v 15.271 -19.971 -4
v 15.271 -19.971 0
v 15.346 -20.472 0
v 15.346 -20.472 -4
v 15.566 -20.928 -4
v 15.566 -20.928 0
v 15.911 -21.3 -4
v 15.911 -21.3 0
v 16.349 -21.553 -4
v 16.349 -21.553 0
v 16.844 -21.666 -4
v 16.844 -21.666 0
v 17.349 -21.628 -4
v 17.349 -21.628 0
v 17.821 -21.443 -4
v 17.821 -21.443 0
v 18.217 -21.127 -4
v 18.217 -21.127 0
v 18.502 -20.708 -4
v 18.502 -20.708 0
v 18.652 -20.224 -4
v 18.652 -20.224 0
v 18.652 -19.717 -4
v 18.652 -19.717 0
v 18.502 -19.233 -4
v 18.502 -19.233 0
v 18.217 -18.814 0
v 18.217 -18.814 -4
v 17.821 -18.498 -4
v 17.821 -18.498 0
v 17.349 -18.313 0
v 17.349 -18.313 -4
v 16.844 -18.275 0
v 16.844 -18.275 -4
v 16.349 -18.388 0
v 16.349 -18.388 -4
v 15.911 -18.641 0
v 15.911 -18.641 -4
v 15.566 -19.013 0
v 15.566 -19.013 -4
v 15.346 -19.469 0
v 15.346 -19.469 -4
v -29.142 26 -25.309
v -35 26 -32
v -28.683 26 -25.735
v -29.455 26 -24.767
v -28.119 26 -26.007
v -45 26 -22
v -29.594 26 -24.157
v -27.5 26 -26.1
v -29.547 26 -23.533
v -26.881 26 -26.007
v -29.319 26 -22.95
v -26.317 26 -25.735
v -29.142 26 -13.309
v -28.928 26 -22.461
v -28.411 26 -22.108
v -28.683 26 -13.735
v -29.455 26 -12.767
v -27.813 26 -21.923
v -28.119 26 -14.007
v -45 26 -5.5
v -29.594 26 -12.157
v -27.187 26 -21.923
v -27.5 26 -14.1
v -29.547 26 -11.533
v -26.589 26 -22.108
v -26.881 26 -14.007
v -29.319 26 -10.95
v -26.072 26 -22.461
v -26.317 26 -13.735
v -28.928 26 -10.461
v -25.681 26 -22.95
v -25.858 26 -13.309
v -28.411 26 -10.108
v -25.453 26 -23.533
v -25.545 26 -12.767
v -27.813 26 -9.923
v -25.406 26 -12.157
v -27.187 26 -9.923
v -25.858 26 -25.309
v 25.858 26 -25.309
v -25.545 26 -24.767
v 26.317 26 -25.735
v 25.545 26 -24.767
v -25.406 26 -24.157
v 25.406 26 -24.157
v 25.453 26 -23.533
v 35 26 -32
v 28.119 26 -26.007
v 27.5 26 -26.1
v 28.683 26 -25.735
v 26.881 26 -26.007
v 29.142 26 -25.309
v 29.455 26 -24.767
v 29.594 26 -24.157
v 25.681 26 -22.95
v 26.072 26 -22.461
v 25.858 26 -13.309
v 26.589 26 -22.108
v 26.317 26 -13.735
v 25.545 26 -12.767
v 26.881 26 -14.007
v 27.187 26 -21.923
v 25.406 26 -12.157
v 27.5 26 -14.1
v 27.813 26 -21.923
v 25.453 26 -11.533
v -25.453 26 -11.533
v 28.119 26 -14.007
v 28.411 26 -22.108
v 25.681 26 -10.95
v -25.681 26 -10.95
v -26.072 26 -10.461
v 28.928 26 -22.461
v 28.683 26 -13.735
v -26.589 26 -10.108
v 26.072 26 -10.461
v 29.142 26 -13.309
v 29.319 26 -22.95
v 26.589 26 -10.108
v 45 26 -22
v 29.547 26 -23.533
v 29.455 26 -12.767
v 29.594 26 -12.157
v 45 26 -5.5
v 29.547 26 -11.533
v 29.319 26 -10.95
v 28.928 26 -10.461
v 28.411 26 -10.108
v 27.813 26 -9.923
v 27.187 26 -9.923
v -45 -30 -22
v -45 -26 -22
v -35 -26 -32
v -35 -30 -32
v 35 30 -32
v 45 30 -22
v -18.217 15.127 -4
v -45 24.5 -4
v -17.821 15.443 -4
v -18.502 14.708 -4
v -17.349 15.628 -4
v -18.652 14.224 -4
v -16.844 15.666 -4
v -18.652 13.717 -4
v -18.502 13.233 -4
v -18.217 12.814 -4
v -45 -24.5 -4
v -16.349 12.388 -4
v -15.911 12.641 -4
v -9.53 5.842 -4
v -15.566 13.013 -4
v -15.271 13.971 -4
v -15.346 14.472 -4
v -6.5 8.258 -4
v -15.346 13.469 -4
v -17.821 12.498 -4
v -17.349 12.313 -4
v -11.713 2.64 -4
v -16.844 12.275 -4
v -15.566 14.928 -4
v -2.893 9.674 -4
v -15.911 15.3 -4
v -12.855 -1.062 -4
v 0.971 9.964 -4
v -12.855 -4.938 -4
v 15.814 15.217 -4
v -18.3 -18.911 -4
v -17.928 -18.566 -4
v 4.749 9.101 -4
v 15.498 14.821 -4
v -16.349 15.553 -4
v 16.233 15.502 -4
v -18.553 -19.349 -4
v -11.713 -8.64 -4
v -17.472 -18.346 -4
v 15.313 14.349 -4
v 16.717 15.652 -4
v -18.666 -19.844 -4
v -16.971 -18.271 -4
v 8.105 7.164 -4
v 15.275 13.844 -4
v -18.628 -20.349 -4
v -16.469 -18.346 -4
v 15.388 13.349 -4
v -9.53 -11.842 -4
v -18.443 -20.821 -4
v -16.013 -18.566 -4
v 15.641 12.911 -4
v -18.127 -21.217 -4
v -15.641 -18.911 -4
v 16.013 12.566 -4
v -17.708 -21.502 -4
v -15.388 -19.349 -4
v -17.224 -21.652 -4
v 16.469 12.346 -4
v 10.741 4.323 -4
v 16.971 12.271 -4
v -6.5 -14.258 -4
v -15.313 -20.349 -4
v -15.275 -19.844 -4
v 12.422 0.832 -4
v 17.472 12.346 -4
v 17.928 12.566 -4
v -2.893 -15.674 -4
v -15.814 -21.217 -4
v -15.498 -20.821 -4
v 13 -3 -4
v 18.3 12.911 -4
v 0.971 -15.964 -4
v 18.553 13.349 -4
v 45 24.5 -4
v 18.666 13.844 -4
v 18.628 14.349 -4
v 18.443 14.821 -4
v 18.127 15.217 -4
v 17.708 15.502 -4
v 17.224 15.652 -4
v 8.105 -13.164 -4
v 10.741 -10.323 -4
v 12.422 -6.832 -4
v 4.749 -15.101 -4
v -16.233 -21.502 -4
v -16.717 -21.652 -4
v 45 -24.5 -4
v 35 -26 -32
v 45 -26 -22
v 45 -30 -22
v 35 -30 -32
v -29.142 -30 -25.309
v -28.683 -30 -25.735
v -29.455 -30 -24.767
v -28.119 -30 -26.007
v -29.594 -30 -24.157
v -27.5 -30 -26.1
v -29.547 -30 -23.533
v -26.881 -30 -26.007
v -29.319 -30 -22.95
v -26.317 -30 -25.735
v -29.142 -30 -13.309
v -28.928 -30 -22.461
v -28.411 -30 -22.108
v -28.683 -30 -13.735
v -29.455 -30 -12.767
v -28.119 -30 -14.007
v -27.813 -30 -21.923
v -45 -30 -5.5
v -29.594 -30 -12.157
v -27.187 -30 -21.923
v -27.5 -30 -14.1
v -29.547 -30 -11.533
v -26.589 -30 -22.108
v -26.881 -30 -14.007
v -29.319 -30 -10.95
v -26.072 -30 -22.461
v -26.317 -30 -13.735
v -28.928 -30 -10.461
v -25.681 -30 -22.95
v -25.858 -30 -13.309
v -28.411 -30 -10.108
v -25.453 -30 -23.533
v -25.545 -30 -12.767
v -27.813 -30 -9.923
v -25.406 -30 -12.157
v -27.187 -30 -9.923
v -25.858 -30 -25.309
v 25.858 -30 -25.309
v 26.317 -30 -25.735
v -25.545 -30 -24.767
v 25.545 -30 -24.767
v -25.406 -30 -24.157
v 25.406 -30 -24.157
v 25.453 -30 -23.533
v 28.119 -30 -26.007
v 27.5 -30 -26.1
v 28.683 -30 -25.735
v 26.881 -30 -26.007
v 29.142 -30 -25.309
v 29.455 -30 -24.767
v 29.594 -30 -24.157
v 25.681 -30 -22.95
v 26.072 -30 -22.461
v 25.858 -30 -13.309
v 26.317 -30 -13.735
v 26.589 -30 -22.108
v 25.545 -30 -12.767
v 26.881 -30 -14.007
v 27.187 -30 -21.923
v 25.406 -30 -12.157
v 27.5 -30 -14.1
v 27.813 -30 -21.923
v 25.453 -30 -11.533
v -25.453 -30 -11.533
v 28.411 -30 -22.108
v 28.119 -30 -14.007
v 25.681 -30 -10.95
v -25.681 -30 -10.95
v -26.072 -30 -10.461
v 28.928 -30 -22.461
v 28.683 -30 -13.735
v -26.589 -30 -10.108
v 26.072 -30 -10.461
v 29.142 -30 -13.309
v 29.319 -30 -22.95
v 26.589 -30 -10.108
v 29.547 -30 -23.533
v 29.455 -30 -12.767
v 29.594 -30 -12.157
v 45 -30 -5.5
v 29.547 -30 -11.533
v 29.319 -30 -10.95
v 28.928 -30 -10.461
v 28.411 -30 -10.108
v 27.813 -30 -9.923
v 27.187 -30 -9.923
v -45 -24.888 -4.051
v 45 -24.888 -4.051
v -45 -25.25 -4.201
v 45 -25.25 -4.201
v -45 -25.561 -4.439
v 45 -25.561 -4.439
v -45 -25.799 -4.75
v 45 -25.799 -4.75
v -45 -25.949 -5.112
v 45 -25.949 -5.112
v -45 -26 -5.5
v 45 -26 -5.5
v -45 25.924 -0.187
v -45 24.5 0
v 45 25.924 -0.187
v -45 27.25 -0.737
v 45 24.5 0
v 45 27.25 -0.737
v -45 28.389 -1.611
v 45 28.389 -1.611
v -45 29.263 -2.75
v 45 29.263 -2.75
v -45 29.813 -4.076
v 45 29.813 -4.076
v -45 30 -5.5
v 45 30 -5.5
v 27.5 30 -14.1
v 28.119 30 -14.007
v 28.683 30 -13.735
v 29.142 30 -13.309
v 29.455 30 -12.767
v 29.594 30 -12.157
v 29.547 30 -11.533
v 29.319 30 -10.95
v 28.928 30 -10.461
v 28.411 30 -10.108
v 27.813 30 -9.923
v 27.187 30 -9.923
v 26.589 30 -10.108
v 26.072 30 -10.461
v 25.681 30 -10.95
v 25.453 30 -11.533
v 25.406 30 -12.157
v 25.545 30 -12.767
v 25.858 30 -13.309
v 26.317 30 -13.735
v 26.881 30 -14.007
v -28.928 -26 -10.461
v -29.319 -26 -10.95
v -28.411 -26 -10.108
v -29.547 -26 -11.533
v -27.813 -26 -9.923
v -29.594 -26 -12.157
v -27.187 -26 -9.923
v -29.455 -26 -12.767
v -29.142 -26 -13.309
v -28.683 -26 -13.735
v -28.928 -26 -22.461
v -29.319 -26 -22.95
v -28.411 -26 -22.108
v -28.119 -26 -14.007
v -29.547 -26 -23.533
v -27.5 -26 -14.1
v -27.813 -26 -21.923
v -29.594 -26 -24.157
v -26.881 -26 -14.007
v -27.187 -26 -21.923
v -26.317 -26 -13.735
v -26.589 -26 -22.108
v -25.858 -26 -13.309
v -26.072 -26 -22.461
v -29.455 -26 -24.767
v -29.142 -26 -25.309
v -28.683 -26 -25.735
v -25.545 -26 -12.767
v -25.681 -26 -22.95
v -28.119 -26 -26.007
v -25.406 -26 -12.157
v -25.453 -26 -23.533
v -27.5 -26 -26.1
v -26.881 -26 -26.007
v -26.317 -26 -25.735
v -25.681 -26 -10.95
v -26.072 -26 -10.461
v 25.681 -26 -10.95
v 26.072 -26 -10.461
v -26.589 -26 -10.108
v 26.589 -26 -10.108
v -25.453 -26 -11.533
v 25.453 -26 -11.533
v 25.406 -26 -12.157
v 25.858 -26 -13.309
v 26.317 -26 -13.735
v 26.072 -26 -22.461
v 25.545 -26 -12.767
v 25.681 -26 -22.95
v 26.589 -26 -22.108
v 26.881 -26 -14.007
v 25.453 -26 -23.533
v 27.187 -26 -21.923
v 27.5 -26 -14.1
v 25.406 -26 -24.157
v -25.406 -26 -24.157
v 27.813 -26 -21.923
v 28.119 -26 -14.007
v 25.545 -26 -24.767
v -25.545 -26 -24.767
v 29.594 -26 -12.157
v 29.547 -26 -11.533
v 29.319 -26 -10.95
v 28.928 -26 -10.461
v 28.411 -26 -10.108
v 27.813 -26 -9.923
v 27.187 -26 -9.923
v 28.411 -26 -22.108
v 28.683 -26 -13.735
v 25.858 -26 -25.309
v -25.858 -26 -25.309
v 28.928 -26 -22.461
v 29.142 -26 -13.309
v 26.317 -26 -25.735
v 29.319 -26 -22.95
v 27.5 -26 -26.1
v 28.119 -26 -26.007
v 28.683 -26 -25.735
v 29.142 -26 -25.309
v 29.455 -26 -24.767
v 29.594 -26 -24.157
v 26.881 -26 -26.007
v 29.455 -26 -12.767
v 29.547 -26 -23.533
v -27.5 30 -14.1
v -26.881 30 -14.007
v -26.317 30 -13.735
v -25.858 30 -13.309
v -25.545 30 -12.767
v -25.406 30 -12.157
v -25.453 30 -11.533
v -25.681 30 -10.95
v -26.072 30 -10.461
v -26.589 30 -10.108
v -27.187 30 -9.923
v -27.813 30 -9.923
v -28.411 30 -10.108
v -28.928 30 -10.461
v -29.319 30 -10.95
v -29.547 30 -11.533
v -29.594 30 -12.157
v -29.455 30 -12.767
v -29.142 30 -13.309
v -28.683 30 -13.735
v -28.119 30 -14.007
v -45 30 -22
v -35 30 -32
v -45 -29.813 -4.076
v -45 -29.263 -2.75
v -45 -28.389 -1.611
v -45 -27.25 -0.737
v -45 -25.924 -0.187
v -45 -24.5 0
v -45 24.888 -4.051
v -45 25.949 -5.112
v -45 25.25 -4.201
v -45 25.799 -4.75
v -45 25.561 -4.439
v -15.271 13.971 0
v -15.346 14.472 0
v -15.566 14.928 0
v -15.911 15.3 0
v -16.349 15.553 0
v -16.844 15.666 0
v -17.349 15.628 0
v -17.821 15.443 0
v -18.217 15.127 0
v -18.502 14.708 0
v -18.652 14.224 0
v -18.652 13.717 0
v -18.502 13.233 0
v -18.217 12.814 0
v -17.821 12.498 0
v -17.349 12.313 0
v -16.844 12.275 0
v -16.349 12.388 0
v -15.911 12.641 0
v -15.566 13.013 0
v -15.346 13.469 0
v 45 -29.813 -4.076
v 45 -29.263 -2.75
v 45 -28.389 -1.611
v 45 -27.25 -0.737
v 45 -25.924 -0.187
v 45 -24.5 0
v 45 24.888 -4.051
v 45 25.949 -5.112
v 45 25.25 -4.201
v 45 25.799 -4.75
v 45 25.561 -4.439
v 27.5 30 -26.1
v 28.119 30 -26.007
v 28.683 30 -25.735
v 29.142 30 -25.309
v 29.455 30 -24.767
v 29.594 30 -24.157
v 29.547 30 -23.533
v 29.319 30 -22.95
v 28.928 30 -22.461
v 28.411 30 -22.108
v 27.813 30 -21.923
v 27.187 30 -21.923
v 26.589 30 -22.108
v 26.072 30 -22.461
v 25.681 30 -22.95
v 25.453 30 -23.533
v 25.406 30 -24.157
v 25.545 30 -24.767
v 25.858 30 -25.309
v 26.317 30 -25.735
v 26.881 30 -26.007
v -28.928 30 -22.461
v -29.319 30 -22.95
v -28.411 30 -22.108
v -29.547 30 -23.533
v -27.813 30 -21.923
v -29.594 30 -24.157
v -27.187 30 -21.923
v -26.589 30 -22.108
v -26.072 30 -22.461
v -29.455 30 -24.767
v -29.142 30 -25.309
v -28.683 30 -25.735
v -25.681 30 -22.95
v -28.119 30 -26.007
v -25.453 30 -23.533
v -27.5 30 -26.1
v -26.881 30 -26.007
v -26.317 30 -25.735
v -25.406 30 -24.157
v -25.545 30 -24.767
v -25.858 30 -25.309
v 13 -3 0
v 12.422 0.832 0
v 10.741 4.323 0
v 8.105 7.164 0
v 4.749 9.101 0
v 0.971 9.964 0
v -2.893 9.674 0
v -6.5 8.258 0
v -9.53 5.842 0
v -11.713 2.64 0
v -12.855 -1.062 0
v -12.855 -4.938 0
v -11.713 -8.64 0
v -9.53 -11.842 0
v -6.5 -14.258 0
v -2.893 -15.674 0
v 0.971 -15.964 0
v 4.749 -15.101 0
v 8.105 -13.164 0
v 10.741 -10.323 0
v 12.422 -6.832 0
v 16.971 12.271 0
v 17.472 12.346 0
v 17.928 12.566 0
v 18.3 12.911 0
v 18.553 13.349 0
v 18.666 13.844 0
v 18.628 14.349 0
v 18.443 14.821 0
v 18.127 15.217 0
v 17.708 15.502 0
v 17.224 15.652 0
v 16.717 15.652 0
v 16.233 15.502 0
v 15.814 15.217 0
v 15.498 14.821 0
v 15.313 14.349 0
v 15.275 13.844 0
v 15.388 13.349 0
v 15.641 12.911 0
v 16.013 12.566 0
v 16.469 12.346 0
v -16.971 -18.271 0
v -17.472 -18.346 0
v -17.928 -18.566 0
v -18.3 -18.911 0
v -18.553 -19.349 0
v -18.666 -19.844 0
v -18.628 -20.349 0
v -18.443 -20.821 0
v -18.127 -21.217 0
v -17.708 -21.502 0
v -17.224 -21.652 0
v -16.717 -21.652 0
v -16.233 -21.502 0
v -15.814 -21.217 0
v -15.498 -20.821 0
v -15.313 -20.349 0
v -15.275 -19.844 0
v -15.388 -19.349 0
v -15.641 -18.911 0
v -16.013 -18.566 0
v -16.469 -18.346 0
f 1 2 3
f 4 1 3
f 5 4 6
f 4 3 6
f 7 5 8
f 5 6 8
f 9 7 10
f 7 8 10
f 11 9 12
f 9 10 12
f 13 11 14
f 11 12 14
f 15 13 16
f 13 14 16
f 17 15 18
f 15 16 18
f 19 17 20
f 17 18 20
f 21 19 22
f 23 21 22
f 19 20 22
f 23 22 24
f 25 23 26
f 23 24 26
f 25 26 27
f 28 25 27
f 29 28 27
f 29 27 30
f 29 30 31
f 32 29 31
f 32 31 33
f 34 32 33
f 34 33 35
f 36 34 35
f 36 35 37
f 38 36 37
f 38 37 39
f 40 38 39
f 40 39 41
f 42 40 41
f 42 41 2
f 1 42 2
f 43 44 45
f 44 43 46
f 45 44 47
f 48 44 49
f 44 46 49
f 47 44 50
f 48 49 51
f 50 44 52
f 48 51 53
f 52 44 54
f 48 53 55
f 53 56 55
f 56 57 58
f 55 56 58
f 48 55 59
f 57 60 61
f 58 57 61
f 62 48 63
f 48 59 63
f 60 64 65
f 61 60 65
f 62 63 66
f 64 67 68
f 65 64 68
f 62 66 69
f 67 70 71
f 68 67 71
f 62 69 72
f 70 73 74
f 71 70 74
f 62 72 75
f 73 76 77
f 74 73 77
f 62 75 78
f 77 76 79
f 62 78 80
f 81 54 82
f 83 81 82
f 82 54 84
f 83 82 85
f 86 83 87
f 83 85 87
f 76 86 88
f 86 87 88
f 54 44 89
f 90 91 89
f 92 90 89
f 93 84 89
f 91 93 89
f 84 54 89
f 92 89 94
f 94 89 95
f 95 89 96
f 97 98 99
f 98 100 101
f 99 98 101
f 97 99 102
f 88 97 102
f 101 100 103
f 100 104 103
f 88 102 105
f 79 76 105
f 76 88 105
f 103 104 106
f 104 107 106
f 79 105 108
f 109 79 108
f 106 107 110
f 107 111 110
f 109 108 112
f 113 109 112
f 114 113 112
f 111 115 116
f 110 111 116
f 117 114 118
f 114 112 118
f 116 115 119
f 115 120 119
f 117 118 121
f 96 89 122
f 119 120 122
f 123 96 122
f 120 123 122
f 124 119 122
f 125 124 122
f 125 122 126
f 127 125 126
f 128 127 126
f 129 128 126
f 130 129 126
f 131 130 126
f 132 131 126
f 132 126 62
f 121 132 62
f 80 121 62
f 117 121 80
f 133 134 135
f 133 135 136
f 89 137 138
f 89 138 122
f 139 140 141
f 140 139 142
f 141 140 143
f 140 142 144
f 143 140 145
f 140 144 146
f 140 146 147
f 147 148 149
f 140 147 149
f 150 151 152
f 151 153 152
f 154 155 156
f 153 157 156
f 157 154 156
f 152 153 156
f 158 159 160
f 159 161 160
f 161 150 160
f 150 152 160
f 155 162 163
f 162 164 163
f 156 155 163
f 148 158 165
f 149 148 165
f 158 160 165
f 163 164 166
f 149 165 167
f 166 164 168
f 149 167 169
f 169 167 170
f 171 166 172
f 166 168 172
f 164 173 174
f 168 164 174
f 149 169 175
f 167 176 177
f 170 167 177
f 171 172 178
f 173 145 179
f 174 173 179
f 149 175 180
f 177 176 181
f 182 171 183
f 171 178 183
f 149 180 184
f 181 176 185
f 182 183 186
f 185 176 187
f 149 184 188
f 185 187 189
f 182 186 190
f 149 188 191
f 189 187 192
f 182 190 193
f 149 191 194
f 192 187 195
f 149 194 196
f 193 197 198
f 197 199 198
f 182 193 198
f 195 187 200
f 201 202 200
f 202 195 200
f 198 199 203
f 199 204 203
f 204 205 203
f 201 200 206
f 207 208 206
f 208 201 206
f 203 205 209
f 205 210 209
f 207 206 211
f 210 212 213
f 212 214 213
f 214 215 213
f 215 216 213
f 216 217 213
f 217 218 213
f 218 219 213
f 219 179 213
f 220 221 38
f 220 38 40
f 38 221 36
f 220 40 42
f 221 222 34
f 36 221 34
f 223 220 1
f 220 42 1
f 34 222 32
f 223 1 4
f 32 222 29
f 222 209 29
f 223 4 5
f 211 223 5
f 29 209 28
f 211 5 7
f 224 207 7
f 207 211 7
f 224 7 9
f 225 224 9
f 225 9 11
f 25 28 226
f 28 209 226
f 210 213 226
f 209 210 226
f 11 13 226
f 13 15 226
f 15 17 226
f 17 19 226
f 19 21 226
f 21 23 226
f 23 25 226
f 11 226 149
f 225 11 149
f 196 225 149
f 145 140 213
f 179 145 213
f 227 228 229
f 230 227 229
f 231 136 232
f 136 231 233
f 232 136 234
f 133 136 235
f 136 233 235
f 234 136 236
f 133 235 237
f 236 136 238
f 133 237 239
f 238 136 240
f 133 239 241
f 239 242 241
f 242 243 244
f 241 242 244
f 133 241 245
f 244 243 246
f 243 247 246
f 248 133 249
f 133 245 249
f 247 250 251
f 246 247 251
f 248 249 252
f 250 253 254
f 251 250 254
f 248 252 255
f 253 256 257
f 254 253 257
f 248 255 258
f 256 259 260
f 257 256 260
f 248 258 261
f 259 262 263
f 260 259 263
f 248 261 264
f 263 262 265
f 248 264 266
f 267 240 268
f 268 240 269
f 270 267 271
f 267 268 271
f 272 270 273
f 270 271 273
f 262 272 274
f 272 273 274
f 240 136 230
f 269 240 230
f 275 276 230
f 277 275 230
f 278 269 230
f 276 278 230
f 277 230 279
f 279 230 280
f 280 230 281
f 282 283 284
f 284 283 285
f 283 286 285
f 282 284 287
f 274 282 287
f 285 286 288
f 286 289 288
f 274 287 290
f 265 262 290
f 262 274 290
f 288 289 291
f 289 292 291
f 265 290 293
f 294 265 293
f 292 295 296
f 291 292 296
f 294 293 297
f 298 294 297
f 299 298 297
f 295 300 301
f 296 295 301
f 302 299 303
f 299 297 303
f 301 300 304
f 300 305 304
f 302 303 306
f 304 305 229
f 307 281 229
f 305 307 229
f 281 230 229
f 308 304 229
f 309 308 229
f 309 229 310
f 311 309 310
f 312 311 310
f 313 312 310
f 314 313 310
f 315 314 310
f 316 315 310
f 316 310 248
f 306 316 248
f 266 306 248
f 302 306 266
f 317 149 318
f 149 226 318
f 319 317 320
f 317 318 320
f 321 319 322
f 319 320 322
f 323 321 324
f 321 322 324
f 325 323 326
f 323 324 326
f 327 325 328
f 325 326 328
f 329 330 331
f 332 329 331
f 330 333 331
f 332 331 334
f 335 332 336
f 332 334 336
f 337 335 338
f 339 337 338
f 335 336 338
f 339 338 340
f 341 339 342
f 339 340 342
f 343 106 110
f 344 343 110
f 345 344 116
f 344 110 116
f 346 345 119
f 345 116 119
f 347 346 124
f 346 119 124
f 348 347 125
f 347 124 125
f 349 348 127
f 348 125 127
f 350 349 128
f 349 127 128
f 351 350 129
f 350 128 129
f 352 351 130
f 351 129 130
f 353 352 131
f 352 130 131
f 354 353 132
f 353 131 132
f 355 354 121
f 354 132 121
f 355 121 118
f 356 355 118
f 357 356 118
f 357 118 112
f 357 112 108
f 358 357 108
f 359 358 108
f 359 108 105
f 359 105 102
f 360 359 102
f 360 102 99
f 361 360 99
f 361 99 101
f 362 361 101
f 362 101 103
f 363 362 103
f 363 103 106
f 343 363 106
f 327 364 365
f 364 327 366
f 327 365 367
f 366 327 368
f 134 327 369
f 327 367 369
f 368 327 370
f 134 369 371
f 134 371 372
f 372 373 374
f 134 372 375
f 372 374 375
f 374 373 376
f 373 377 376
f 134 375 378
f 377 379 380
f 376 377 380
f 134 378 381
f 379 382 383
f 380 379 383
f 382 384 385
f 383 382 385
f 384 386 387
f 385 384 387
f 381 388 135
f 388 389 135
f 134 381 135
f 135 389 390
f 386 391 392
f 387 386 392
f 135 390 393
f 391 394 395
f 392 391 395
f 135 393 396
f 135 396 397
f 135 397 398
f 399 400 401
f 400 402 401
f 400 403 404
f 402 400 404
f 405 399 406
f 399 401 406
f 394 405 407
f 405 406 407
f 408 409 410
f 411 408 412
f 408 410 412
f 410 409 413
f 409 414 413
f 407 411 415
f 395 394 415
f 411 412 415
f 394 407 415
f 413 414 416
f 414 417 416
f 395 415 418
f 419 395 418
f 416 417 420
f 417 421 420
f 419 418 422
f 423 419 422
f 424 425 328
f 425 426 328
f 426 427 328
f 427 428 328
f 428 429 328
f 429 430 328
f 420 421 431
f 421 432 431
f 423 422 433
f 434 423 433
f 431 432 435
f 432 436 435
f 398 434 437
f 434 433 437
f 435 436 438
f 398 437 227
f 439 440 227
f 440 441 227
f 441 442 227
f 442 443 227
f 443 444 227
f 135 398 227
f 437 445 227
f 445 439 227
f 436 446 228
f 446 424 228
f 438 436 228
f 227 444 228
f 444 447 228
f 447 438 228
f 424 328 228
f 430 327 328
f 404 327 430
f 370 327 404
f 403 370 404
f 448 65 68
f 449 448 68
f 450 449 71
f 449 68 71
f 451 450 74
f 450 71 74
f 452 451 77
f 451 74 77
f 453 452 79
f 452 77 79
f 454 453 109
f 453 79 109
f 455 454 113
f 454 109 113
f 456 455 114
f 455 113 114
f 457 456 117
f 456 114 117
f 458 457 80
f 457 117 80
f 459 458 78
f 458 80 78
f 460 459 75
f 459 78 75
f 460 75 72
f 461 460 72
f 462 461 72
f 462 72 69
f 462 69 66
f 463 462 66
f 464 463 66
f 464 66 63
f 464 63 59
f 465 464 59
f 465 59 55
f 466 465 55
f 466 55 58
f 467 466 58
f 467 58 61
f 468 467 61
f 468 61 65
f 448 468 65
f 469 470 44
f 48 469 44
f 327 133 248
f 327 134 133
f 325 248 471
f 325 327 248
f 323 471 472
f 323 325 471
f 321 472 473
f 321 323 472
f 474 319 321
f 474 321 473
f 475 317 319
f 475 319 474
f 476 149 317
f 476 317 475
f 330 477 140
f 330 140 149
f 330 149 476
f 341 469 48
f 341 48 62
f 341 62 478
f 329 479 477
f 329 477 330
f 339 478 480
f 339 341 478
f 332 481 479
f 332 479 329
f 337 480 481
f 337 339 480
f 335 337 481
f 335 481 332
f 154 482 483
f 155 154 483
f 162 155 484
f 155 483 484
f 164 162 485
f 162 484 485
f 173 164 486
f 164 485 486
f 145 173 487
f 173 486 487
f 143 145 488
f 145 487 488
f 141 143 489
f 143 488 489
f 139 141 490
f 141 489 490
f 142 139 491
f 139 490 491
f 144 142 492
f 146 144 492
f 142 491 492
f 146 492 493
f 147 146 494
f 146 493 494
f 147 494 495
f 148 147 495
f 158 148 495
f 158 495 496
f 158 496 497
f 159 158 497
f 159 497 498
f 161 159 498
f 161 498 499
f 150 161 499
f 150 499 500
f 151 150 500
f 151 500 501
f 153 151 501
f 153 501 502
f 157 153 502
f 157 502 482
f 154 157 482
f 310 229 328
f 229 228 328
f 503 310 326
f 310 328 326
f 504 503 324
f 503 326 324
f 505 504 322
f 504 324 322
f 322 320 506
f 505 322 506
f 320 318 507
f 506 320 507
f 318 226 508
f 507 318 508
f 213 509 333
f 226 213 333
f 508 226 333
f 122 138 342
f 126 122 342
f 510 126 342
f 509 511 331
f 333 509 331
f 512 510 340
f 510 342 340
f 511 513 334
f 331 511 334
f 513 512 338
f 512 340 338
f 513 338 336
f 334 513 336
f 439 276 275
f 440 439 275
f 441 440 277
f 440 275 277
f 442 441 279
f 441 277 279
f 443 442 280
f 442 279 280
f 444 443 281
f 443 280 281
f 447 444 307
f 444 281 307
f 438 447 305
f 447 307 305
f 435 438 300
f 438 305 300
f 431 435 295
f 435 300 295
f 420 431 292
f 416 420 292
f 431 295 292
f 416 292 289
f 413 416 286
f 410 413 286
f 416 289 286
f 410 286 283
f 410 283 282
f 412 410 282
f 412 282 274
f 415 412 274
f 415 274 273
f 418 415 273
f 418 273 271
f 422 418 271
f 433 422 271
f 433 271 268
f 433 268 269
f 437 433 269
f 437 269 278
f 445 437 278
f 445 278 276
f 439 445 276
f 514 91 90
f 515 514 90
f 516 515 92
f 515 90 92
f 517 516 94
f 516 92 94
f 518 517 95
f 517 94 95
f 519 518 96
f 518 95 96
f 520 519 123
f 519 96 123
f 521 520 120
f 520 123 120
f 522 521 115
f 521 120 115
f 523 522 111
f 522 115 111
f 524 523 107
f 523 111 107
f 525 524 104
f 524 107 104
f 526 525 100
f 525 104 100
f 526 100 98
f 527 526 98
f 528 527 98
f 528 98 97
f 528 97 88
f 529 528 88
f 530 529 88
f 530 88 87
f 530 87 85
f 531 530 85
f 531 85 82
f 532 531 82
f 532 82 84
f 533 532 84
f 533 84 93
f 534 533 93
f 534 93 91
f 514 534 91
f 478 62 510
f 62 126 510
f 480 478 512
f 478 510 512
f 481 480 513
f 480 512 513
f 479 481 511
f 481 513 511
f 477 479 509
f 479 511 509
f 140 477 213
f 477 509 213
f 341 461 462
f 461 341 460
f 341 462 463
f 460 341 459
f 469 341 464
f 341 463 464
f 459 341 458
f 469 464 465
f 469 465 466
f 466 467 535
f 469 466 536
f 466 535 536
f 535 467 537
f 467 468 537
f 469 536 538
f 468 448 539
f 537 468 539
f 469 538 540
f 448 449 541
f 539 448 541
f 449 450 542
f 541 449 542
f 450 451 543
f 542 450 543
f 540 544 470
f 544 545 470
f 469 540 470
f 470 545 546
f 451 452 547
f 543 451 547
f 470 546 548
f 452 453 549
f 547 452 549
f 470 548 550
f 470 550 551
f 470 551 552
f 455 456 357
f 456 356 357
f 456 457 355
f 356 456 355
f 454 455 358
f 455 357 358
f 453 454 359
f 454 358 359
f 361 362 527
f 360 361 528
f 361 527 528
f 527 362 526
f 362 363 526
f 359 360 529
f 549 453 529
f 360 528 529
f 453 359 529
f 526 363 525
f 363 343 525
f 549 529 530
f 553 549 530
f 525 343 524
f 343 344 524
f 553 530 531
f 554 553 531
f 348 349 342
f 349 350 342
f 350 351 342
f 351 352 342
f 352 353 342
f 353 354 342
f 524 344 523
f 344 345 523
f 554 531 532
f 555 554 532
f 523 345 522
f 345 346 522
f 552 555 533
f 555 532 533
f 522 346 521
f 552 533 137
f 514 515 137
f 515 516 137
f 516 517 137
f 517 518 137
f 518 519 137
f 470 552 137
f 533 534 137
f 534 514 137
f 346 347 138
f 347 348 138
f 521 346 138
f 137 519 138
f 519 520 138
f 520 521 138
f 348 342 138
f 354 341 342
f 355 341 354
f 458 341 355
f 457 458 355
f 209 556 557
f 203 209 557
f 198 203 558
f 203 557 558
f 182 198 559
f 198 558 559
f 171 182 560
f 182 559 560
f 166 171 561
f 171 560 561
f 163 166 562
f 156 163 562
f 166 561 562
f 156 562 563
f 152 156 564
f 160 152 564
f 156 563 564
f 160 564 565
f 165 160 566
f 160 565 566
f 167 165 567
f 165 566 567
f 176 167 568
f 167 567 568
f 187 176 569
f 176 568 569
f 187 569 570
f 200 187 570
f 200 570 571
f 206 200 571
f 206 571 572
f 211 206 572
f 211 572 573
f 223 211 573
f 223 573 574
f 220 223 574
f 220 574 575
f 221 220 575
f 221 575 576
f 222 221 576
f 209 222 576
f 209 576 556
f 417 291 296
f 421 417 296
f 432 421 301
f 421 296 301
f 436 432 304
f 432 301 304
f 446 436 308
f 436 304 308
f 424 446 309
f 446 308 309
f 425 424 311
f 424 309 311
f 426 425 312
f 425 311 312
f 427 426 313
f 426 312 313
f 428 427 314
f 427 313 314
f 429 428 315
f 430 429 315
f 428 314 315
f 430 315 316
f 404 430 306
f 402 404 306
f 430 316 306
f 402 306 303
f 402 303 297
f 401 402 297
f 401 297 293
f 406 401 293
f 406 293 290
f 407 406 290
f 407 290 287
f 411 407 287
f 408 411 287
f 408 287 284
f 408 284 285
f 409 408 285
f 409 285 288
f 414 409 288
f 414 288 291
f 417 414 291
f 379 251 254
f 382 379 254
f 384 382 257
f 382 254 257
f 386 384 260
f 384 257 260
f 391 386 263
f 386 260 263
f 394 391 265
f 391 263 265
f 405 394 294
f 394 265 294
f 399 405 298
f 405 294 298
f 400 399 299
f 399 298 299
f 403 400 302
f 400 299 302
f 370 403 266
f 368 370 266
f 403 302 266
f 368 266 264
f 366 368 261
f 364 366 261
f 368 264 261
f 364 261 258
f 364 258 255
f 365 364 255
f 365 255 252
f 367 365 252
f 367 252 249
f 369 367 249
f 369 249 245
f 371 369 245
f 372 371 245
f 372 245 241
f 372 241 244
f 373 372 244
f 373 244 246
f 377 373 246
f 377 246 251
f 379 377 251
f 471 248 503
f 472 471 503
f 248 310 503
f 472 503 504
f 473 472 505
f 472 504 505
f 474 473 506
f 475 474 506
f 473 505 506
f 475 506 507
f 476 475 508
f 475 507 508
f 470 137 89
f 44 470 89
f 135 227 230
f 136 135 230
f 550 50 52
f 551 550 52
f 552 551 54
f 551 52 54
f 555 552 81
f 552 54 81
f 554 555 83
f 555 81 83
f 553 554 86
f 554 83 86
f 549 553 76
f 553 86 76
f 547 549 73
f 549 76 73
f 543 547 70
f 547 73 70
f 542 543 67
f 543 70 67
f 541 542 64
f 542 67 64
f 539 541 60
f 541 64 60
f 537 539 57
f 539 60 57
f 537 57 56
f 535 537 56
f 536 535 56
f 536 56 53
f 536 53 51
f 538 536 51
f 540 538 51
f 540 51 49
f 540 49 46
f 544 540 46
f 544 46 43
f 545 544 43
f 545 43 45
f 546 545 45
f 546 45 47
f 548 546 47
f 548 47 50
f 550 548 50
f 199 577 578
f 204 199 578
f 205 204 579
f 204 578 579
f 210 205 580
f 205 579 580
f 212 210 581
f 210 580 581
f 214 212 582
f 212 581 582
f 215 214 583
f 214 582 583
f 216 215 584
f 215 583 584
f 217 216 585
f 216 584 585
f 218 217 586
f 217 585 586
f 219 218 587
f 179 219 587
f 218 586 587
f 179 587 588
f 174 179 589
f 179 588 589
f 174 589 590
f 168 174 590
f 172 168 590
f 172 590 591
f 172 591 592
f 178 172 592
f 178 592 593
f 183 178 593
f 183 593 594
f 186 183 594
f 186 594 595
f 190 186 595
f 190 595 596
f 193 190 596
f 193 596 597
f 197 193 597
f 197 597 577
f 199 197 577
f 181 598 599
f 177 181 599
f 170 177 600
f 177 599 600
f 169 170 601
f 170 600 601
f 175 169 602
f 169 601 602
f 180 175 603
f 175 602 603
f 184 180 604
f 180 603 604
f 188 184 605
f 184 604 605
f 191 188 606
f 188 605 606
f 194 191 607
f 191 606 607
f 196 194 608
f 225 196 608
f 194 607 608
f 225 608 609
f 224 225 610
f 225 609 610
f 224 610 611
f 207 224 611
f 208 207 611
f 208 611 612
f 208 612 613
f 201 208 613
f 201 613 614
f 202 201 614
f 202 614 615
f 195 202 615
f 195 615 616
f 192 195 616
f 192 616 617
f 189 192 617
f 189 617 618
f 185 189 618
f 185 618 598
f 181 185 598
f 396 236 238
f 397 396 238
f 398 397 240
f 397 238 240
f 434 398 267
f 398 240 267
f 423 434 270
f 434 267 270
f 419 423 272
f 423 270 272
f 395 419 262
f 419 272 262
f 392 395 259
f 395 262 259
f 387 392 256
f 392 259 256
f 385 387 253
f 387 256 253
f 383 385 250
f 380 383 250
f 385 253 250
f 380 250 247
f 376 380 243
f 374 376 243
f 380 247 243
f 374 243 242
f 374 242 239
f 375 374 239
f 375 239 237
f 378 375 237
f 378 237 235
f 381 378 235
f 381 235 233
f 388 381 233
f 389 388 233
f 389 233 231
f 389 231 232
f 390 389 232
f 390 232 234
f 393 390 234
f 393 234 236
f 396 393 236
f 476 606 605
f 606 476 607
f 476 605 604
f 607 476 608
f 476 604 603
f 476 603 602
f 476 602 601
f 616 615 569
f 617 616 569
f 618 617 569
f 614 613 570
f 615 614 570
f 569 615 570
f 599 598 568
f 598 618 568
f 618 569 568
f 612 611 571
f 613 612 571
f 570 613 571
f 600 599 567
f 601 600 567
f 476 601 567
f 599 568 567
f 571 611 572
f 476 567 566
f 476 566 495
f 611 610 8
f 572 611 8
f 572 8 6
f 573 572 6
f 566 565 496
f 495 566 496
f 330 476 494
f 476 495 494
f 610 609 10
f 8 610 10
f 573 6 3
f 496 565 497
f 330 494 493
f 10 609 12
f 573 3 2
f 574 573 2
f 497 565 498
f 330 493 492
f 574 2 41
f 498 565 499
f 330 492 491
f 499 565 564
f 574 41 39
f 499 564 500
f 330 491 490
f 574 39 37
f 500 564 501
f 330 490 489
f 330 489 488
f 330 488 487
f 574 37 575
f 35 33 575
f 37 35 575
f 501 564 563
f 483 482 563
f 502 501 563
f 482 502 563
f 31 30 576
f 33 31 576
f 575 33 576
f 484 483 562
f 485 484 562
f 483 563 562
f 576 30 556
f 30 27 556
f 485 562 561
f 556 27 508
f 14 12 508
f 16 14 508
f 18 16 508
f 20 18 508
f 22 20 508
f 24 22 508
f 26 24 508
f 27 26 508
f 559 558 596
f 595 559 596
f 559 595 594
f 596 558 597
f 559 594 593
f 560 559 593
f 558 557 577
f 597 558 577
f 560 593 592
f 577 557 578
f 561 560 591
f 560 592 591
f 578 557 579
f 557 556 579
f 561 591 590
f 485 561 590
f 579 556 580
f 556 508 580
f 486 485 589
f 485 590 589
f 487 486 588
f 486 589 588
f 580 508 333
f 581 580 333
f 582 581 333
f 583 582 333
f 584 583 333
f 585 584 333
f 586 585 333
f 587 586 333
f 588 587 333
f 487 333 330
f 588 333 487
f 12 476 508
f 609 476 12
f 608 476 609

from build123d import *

# Parameters (mm, degrees)
SM_BASE_FLANGE_1_DEPTH   = 45
SKETCH_7_R               = 13
CUT_EXTRUDE_1_DEPTH      = 63.841069373
CHAMFER_1_SIZE           = 10
SKETCH_9_R               = 1
CUT_EXTRUDE_3_DEPTH      = 82.541400528
M5X0_8_1_D               = 4.2
CUT_EXTRUDE_4_REACH      = 64.841
SKETCH_11_R              = 1.7
PATTERN_CIRCULAR_1_COUNT = 4


# Sheet-metal steps are written as plain solids
with BuildPart() as part:
    # Sketch 2 → 基材-凸緣1 (new, symmetric)
    with BuildSketch(Plane(origin=(0, 0, 0), x_dir=(0, 0, -1), z_dir=(1, 0, 0))):
        with BuildLine():
            Line((32, -30), (5.5, -30))
            ThreePointArc((5.5, -30), (1.610912703, -28.389087297), (0, -24.5))
            Line((0, -24.5), (0, 24.5))
            ThreePointArc((0, 24.5), (1.610912703, 28.389087297), (5.5, 30))
            Line((5.5, 30), (32, 30))
            Line((32, 30), (32, 26))
            Line((32, 26), (5.5, 26))
            ThreePointArc((5.5, 26), (4.439339828, 25.560660172), (4, 24.5))
            Line((4, 24.5), (4, -24.5))
            ThreePointArc((4, -24.5), (4.439339828, -25.560660172), (5.5, -26))
            Line((5.5, -26), (32, -26))
            Line((32, -26), (32, -30))
        make_face()
    extrude(amount=SM_BASE_FLANGE_1_DEPTH, both=True)

    # 草圖7 → 除料-伸長1 (cut, through all)
    with BuildSketch(Plane.XY):
        with Locations((0, -3)):
            Circle(SKETCH_7_R)
    extrude(amount=-CUT_EXTRUDE_1_DEPTH, mode=Mode.SUBTRACT)

    # 導角1
    chamfer_1_edges = [part.edges().sort_by_distance(p)[0] for p in [
        (-45, 28, -32),
        (-45, -28, -32),
        (45, 28, -32),
        (45, -28, -32),
    ]]
    chamfer(chamfer_1_edges, length=CHAMFER_1_SIZE)

    # 草圖9 → 除料-伸長3 (cut, through all)
    with BuildSketch(Plane(origin=(0, 30, 0), x_dir=(1, 0, 0), z_dir=(0, 1, 0))):
        with Locations(Location((-27.5, 24, 0), (0, 0, 270))):
            Circle(SKETCH_9_R)
        with Locations(Location((27.5, 24, 0), (0, 0, 270))):
            Circle(SKETCH_9_R)
        with Locations(Location((-27.5, 12, 0), (0, 0, 270))):
            Circle(SKETCH_9_R)
        with Locations(Location((27.5, 12, 0), (0, 0, 270))):
            Circle(SKETCH_9_R)
    extrude(amount=-CUT_EXTRUDE_3_DEPTH, mode=Mode.SUBTRACT)

    # M5x0.8 螺紋孔1 (through all)
    with Locations(Plane(origin=(-27.5, 30, -24), x_dir=(0, 0, 1), z_dir=(0, 1, 0))):
        with Locations((0, 0), (12, 0), (12, 55), (0, 55)):
            Hole(M5X0_8_1_D / 2)

    # 草圖11 → 除料-伸長4 (cut, up to next)
    with BuildSketch(Plane.XY, mode=Mode.PRIVATE) as cut_extrude_4_sk1:
        with Locations((-16.970562748, 13.970562748)):
            Circle(SKETCH_11_R)
    cut_extrude_4_tool1 = extrude(cut_extrude_4_sk1.sketch, amount=-CUT_EXTRUDE_4_REACH, mode=Mode.PRIVATE) & part.part
    cut_extrude_4 = cut_extrude_4_tool1.solids().sort_by_distance((-16.970563, 13.970563, 0))[0]
    add(cut_extrude_4, mode=Mode.SUBTRACT)

    # 環狀複製排列1: 除料-伸長4 ×4 about axis
    pattern_circular_1_axis = Axis((0, -3, 0), (0, 0, 1))
    for i in range(1, PATTERN_CIRCULAR_1_COUNT):
        add(cut_extrude_4.rotate(pattern_circular_1_axis, i * 360 / PATTERN_CIRCULAR_1_COUNT), mode=Mode.SUBTRACT)


solid = part.part
